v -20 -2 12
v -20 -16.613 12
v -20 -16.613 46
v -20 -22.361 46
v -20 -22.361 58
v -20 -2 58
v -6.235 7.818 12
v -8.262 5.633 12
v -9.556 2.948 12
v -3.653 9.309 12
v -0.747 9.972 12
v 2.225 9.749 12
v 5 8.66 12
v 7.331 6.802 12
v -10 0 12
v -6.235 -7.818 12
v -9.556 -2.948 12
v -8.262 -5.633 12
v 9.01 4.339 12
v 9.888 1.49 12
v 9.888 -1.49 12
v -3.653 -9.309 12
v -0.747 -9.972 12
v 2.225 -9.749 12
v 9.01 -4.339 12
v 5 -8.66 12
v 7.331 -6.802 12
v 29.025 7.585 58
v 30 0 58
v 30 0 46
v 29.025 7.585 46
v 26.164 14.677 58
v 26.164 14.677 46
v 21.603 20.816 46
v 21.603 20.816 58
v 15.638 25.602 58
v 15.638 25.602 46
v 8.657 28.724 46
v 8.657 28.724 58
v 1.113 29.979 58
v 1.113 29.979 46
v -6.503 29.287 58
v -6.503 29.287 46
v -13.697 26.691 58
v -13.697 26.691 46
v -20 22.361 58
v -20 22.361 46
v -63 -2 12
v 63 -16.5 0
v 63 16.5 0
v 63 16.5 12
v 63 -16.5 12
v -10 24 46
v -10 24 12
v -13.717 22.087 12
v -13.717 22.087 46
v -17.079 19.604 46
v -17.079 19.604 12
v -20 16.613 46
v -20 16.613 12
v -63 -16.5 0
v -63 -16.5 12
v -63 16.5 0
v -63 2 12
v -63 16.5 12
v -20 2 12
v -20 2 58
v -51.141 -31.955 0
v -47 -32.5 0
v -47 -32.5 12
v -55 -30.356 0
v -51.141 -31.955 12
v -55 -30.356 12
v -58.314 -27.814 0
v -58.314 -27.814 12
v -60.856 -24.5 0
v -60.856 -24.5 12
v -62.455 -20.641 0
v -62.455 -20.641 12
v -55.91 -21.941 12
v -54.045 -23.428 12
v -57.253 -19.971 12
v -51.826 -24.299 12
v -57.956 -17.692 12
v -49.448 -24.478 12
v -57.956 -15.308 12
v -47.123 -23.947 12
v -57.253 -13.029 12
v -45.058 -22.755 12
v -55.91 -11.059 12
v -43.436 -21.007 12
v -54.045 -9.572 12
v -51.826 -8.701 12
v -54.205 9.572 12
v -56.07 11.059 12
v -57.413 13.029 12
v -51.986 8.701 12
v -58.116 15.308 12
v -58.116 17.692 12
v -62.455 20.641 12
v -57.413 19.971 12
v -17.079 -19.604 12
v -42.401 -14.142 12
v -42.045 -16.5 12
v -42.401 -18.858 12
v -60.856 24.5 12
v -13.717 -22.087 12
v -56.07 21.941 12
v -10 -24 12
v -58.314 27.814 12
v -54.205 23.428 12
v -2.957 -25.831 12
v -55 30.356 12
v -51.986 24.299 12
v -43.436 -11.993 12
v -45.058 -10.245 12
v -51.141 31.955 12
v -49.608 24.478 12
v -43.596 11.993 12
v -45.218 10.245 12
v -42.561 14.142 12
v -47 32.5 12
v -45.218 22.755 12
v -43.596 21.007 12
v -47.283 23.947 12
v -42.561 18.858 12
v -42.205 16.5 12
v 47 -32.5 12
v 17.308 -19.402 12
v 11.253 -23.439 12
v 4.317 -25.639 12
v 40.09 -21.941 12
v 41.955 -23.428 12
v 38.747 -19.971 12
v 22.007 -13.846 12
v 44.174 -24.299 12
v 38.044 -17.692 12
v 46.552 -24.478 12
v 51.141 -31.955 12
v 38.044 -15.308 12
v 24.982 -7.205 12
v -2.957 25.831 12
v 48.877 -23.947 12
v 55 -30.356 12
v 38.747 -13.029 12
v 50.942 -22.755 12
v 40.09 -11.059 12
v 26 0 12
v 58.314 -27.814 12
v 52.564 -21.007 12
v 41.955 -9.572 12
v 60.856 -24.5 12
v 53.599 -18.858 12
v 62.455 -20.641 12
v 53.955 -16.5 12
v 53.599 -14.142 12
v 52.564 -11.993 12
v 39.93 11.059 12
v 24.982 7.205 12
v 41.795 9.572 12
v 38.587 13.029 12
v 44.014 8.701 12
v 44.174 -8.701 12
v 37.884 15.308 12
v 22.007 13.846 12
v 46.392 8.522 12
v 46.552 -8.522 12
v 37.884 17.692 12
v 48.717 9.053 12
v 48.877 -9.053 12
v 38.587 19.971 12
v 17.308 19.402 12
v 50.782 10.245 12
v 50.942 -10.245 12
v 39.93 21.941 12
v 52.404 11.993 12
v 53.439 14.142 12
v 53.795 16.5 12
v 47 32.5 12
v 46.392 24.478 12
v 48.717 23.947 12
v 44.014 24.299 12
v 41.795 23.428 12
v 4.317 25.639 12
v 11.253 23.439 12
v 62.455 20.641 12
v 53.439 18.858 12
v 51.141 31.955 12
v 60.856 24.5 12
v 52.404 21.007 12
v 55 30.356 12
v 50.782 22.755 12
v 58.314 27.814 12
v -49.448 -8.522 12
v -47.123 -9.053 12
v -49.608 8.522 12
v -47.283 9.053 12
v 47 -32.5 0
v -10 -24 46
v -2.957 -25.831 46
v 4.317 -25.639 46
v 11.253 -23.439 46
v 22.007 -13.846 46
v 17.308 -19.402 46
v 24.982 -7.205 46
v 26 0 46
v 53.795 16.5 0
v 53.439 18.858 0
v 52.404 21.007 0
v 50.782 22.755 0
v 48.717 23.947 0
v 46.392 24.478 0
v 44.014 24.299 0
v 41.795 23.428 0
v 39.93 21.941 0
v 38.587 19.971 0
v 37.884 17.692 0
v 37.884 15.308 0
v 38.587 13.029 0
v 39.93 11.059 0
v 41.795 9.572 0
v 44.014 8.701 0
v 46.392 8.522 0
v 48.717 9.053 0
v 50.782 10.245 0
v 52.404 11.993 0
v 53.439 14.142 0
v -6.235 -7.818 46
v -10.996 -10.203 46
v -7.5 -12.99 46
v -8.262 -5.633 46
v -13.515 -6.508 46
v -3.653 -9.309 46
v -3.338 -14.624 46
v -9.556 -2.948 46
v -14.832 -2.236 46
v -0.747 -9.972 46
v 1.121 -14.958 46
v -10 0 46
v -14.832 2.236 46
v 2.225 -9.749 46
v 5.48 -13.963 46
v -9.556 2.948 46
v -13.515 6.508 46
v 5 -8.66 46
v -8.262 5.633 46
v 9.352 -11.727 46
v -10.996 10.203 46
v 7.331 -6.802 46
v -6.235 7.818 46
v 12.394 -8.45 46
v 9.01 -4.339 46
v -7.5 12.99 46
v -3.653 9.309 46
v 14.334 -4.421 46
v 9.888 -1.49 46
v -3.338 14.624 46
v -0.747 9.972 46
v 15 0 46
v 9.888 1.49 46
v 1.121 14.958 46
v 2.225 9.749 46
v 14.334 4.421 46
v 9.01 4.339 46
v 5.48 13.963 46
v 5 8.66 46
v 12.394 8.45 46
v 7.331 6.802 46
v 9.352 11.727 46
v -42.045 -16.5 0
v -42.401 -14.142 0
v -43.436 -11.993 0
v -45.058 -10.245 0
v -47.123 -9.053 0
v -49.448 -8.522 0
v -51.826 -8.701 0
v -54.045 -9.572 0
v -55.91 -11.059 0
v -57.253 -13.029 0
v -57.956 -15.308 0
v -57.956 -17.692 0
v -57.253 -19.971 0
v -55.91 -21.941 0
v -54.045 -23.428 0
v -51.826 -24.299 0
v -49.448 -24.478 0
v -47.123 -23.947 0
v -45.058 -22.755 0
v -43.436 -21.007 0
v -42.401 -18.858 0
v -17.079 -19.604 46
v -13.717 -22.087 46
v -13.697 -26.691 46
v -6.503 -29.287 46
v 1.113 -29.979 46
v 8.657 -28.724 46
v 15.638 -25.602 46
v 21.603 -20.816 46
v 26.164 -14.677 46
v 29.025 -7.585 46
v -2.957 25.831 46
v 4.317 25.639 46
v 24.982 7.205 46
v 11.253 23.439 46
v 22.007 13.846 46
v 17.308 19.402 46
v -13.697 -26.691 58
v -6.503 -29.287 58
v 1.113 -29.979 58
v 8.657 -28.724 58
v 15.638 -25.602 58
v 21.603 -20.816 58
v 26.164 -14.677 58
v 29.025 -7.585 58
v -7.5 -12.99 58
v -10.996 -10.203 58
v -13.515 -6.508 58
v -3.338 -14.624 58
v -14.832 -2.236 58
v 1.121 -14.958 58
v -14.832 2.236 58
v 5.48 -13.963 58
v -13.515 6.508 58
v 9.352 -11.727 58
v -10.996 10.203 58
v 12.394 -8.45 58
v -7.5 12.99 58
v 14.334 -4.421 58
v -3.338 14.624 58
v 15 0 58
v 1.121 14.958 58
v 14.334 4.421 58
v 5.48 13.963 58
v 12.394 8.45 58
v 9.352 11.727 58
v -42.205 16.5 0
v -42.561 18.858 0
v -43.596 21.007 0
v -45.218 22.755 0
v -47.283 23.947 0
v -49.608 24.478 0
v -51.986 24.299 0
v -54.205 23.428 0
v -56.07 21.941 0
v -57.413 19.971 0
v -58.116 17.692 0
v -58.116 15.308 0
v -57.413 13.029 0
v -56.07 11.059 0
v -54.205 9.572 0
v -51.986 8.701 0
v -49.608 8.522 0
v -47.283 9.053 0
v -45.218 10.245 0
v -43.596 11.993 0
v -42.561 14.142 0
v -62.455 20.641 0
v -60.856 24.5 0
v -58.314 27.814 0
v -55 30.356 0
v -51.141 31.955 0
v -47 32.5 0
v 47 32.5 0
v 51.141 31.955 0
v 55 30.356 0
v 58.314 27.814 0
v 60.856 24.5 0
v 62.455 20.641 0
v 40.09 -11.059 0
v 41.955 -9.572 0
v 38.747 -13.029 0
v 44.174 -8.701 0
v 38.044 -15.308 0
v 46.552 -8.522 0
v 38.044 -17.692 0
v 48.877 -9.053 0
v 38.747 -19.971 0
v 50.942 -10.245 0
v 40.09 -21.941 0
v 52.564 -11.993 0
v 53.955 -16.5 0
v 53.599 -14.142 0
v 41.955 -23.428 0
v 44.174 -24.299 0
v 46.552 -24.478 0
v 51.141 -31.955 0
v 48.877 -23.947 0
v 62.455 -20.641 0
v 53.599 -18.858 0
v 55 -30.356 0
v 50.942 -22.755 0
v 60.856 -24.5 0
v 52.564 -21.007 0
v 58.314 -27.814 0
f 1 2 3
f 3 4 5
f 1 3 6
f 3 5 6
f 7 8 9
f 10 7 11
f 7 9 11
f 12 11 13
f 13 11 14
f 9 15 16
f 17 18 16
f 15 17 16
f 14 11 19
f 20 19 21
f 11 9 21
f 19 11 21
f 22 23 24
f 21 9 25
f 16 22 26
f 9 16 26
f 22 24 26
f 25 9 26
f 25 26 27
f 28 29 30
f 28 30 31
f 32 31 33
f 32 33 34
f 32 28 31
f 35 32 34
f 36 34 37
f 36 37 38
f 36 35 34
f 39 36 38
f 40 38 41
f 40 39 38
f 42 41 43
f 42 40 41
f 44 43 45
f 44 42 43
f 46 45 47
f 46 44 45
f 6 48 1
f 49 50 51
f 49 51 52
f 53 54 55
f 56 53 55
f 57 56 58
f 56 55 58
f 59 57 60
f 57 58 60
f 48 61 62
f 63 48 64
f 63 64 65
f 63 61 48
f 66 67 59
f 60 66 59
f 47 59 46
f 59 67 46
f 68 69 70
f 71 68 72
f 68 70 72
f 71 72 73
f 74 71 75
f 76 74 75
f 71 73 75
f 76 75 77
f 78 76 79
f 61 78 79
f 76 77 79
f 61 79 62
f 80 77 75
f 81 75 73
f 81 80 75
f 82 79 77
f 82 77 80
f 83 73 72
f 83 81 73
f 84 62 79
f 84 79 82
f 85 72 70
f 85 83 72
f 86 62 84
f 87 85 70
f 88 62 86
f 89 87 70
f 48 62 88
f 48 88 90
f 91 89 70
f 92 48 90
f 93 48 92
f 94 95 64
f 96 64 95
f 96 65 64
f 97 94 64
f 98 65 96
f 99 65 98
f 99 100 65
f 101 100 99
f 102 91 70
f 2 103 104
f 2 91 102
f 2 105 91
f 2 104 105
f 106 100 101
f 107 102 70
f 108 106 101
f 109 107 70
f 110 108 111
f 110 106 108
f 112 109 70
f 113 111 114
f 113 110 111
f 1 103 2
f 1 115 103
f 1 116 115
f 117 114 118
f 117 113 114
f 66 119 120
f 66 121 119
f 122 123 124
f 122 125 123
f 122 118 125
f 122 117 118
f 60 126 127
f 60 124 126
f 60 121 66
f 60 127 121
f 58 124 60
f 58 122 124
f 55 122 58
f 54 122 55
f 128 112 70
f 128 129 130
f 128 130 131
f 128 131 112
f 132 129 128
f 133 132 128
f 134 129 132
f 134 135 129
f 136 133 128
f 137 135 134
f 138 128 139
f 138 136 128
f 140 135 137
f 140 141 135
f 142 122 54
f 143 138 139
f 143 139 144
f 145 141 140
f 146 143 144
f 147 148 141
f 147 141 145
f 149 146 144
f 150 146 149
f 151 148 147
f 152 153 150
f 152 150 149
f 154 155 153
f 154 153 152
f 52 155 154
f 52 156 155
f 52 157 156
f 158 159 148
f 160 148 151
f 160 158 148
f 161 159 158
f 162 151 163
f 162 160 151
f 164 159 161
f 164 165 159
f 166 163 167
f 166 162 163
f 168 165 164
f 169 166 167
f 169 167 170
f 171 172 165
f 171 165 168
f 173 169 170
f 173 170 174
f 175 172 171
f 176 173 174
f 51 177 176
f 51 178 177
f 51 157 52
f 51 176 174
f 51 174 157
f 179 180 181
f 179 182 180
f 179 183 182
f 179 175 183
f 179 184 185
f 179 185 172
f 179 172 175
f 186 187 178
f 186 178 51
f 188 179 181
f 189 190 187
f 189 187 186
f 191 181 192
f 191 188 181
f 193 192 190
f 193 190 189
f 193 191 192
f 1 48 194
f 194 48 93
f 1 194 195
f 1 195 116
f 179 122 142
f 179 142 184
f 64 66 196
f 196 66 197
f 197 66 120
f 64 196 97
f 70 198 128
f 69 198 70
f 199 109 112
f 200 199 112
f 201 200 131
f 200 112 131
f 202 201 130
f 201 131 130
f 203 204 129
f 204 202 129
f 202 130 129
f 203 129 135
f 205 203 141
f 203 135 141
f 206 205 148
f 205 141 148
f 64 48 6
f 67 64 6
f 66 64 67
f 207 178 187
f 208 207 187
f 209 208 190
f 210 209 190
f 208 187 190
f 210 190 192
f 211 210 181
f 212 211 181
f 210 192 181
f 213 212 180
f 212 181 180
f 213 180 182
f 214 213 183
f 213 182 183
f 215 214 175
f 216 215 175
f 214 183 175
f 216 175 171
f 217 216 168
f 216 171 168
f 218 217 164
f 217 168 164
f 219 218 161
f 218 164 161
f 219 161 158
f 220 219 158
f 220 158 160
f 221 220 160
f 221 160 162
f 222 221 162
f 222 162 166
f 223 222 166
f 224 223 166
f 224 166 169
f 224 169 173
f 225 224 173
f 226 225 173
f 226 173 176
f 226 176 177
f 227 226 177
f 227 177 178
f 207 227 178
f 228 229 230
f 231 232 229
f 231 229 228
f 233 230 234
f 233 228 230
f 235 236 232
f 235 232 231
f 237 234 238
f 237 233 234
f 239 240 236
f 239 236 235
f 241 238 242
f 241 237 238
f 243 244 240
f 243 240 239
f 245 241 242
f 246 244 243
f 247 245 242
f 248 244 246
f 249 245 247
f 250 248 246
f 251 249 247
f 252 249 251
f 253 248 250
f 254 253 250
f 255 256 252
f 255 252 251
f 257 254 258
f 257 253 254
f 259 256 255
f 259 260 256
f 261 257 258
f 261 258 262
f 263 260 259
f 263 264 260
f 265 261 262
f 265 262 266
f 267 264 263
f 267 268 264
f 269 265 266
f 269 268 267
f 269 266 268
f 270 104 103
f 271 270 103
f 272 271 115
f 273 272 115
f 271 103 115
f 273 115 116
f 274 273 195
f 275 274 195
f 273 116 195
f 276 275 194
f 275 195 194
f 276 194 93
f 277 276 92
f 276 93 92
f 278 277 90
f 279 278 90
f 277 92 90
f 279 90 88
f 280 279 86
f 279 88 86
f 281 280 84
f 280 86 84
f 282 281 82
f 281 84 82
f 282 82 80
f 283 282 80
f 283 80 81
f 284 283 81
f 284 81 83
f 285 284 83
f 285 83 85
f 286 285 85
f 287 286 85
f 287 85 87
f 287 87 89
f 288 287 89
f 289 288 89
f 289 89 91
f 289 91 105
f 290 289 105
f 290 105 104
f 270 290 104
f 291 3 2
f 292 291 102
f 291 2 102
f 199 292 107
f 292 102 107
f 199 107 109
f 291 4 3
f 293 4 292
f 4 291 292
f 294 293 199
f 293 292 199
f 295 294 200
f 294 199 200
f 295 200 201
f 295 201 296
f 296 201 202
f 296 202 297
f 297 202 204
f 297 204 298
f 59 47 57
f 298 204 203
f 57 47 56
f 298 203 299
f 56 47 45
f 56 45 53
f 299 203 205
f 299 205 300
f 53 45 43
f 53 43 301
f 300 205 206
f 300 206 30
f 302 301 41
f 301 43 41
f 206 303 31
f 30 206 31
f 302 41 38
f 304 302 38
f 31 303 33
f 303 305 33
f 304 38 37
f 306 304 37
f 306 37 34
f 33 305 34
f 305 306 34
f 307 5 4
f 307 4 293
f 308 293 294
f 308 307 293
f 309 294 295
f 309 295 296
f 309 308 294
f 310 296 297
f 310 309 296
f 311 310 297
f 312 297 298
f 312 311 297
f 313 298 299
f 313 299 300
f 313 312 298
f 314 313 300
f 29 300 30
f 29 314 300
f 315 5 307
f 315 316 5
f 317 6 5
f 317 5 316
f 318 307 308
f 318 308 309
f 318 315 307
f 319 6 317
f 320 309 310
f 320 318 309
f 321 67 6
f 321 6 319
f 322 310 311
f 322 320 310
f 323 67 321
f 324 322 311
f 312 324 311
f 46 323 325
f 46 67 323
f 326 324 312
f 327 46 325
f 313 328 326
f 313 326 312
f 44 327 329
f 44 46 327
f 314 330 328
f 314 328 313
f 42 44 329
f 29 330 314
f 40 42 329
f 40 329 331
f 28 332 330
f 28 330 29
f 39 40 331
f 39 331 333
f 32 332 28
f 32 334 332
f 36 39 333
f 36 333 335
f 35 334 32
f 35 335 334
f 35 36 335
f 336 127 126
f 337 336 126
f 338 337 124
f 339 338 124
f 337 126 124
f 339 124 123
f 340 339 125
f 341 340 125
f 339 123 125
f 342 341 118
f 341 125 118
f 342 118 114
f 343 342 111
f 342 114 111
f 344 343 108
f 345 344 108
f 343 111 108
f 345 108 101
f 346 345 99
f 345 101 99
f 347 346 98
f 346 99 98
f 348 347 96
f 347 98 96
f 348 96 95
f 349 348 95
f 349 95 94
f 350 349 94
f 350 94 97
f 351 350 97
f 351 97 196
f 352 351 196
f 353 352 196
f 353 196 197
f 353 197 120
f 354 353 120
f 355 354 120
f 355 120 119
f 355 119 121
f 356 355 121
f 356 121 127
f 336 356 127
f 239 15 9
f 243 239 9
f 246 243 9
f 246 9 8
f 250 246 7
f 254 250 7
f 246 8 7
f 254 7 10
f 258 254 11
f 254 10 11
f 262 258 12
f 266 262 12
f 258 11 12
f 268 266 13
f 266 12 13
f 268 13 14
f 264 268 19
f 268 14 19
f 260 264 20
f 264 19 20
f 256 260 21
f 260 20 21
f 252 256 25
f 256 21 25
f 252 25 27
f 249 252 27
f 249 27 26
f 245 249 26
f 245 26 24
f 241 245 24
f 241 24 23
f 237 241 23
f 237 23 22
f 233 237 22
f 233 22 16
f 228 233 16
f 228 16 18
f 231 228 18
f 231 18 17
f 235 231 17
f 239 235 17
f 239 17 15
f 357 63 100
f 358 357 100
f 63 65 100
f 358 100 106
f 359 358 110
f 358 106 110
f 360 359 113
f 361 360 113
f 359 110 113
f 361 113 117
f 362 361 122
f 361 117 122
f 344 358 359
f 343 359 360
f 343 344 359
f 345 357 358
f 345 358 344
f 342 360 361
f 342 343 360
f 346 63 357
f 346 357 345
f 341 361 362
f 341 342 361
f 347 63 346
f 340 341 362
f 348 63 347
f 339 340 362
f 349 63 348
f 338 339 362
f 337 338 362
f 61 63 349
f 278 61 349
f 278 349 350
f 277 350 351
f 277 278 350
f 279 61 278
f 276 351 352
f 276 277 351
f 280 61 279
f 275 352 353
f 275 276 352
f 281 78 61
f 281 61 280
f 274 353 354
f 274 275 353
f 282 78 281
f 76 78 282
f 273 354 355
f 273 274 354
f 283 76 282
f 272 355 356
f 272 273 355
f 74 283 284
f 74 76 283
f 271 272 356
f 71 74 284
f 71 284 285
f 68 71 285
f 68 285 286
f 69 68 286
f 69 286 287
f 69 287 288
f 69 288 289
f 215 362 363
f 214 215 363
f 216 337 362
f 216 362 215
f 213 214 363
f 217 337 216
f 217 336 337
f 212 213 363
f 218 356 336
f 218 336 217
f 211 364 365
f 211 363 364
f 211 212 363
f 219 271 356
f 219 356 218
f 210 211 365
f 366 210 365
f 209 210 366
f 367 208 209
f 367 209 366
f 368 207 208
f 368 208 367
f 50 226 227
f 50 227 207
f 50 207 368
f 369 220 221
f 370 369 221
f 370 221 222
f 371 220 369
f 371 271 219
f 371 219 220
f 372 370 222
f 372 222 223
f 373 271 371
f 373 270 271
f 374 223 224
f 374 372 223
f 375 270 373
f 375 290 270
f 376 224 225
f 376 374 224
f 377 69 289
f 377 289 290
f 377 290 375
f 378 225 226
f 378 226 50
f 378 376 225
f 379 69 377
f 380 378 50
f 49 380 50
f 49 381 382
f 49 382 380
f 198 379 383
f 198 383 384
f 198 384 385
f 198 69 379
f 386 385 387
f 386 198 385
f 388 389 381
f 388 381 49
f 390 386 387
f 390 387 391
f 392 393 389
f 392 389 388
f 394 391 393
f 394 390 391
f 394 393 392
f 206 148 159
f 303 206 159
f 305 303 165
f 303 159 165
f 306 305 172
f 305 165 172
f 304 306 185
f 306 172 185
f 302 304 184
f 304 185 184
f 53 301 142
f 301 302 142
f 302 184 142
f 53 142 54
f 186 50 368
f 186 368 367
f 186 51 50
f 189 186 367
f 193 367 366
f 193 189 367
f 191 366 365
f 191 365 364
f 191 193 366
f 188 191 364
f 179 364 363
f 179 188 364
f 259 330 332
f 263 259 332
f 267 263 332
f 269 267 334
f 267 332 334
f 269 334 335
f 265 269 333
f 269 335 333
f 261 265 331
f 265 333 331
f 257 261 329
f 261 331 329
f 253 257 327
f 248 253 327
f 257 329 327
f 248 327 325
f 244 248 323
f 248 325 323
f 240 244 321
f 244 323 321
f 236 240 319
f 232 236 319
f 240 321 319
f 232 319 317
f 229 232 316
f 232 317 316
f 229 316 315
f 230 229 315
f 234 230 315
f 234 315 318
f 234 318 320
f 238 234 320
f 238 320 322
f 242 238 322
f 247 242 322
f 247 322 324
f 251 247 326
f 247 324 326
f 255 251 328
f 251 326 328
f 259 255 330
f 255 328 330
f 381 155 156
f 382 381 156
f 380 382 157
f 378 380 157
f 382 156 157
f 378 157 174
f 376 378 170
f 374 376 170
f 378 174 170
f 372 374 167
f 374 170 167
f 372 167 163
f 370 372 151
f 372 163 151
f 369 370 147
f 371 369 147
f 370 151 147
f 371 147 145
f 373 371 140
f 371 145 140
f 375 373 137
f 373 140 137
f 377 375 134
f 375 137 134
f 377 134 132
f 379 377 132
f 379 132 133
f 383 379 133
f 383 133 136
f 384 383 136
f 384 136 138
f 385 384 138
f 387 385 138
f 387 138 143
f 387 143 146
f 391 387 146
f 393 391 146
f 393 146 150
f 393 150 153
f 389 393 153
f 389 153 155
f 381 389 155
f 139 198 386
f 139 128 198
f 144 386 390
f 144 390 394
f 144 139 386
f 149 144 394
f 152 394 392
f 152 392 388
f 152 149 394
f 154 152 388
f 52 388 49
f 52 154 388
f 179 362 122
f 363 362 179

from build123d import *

# Parameters (mm, degrees)
F1_DEPTH  = 58
F3_DEPTH  = 12
F4_R      = 8
F5_DEPTH  = 25
F6_R      = 16
F7_R      = 10
F8_DEPTH  = 12
F9_R      = 15
F9_R_2    = 10
F10_DEPTH = 12
F11_DEPTH = 46
F12_W     = 43
F12_H     = 4
F13_DEPTH = 46
F15_DEPTH = 25


with BuildPart() as f1:
    # F0 (on Top) → F1 (new body)
    with BuildSketch(Plane.XY):
        with BuildLine():
            ThreePointArc((-10, -24), (14.4222051019, -21.6333076528), (26, 0))
            ThreePointArc((26, 0), (14.4222051019, 21.6333076528), (-10, 24))
            Line((-10, 24), (-10, 0))
            Line((-10, 0), (-10, -24))
        make_face()
        with BuildLine():
            ThreePointArc((10, 0), (0, -10), (-10, 0))
            ThreePointArc((-10, 0), (0, 10), (10, 0))
        make_face(mode=Mode.SUBTRACT)
        with BuildLine():
            Line((-10, 0), (-10, 24))
            ThreePointArc((-10, 24), (-26, 0), (-10, -24))
            Line((-10, -24), (-10, 0))
        make_face()
    extrude(amount=F1_DEPTH)

    # F2 (on face) → F3 (join)
    with BuildSketch(Plane(origin=(0, 0, 0), x_dir=(1, 0, 0), z_dir=(0, 0, -1))):
        Polygon((63, 32.5), (0, 32.5), (-63, 32.5), (-63, -32.5), (63, -32.5), align=None)
    extrude(amount=-F3_DEPTH)

    # F4 (on face) → F5 (cut)
    with BuildSketch(Plane.XY.offset(12)):
        with Locations((-50.0454586766, -16.5)):
            Circle(F4_R)
        with Locations((-50.2054683586, 16.5)):
            Circle(F4_R)
        with Locations((45.7945316414, 16.5)):
            Circle(F4_R)
        with Locations((45.9545413234, -16.5)):
            Circle(F4_R)
    extrude(amount=-F5_DEPTH, mode=Mode.SUBTRACT)

    # F6
    f6_edges = [f1.edges().sort_by_distance(p)[0] for p in [
        (-63, 32.5, 6),
        (-63, -32.5, 6),
        (63, 32.5, 6),
        (63, -32.5, 6),
    ]]
    fillet(f6_edges, radius=F6_R)

    # F7 (on face) → F8 (join)
    with BuildSketch(Plane.XY.offset(58)):
        with BuildLine():
            ThreePointArc((26, 0), (8.8317608663, 24.4540385213), (-20, 16.6132477258))
            Line((-20, 16.6132477258), (-20, -16.6132477258))
            ThreePointArc((-20, -16.6132477258), (8.8317608663, -24.4540385213), (26, 0))
        make_face()
        Circle(F7_R, mode=Mode.SUBTRACT)
        with BuildLine():
            ThreePointArc((-20, -22.360679775), (12.2474487139, -27.3861278753), (30, 0))
            ThreePointArc((30, 0), (12.2474487139, 27.3861278753), (-20, 22.360679775))
            Line((-20, 22.360679775), (-20, 16.6132477258))
            ThreePointArc((-20, 16.6132477258), (8.8317608663, 24.4540385213), (26, 0))
            ThreePointArc((26, 0), (8.8317608663, -24.4540385213), (-20, -16.6132477258))
            Line((-20, -16.6132477258), (-20, -22.360679775))
        make_face()
        Circle(F7_R)
        with BuildLine():
            Line((-20, 16.6132477258), (-20, 22.360679775))
            ThreePointArc((-20, 22.360679775), (-30, 0), (-20, -22.360679775))
            Line((-20, -22.360679775), (-20, -16.6132477258))
            ThreePointArc((-20, -16.6132477258), (-26, 0), (-20, 16.6132477258))
        make_face()
        with BuildLine():
            Line((-20, -16.6132477258), (-20, 16.6132477258))
            ThreePointArc((-20, 16.6132477258), (-26, 0), (-20, -16.6132477258))
        make_face()
    extrude(amount=-F8_DEPTH)

    # F9 (on face) → F10 (cut)
    with BuildSketch(Plane.XY.offset(58)):
        Circle(F9_R)
        Circle(F9_R_2, mode=Mode.SUBTRACT)
        Circle(F9_R_2)
    extrude(amount=-F10_DEPTH, mode=Mode.SUBTRACT)

    # F7 (on face) → F11 (cut)
    with BuildSketch(Plane.XY.offset(58)):
        with BuildLine():
            Line((-20, 16.6132477258), (-20, 22.360679775))
            ThreePointArc((-20, 22.360679775), (-30, 0), (-20, -22.360679775))
            Line((-20, -22.360679775), (-20, -16.6132477258))
            ThreePointArc((-20, -16.6132477258), (-26, 0), (-20, 16.6132477258))
        make_face()
        with BuildLine():
            Line((-20, -16.6132477258), (-20, 16.6132477258))
            ThreePointArc((-20, 16.6132477258), (-26, 0), (-20, -16.6132477258))
        make_face()
    extrude(amount=-F11_DEPTH, mode=Mode.SUBTRACT)

    # F12 (on face) → F13 (join)
    with BuildSketch(Plane.XY.offset(12)):
        with Locations((-41.5, 0)):
            Rectangle(F12_W, F12_H)
    extrude(amount=F13_DEPTH)

    # F14 (on face) → F15 (cut)
    with BuildSketch(Plane.XZ.offset(2)):
        Polygon((-63, 12), (-20, 58), (-63, 58), align=None)
    extrude(amount=-F15_DEPTH, mode=Mode.SUBTRACT)


solid = f1.part
